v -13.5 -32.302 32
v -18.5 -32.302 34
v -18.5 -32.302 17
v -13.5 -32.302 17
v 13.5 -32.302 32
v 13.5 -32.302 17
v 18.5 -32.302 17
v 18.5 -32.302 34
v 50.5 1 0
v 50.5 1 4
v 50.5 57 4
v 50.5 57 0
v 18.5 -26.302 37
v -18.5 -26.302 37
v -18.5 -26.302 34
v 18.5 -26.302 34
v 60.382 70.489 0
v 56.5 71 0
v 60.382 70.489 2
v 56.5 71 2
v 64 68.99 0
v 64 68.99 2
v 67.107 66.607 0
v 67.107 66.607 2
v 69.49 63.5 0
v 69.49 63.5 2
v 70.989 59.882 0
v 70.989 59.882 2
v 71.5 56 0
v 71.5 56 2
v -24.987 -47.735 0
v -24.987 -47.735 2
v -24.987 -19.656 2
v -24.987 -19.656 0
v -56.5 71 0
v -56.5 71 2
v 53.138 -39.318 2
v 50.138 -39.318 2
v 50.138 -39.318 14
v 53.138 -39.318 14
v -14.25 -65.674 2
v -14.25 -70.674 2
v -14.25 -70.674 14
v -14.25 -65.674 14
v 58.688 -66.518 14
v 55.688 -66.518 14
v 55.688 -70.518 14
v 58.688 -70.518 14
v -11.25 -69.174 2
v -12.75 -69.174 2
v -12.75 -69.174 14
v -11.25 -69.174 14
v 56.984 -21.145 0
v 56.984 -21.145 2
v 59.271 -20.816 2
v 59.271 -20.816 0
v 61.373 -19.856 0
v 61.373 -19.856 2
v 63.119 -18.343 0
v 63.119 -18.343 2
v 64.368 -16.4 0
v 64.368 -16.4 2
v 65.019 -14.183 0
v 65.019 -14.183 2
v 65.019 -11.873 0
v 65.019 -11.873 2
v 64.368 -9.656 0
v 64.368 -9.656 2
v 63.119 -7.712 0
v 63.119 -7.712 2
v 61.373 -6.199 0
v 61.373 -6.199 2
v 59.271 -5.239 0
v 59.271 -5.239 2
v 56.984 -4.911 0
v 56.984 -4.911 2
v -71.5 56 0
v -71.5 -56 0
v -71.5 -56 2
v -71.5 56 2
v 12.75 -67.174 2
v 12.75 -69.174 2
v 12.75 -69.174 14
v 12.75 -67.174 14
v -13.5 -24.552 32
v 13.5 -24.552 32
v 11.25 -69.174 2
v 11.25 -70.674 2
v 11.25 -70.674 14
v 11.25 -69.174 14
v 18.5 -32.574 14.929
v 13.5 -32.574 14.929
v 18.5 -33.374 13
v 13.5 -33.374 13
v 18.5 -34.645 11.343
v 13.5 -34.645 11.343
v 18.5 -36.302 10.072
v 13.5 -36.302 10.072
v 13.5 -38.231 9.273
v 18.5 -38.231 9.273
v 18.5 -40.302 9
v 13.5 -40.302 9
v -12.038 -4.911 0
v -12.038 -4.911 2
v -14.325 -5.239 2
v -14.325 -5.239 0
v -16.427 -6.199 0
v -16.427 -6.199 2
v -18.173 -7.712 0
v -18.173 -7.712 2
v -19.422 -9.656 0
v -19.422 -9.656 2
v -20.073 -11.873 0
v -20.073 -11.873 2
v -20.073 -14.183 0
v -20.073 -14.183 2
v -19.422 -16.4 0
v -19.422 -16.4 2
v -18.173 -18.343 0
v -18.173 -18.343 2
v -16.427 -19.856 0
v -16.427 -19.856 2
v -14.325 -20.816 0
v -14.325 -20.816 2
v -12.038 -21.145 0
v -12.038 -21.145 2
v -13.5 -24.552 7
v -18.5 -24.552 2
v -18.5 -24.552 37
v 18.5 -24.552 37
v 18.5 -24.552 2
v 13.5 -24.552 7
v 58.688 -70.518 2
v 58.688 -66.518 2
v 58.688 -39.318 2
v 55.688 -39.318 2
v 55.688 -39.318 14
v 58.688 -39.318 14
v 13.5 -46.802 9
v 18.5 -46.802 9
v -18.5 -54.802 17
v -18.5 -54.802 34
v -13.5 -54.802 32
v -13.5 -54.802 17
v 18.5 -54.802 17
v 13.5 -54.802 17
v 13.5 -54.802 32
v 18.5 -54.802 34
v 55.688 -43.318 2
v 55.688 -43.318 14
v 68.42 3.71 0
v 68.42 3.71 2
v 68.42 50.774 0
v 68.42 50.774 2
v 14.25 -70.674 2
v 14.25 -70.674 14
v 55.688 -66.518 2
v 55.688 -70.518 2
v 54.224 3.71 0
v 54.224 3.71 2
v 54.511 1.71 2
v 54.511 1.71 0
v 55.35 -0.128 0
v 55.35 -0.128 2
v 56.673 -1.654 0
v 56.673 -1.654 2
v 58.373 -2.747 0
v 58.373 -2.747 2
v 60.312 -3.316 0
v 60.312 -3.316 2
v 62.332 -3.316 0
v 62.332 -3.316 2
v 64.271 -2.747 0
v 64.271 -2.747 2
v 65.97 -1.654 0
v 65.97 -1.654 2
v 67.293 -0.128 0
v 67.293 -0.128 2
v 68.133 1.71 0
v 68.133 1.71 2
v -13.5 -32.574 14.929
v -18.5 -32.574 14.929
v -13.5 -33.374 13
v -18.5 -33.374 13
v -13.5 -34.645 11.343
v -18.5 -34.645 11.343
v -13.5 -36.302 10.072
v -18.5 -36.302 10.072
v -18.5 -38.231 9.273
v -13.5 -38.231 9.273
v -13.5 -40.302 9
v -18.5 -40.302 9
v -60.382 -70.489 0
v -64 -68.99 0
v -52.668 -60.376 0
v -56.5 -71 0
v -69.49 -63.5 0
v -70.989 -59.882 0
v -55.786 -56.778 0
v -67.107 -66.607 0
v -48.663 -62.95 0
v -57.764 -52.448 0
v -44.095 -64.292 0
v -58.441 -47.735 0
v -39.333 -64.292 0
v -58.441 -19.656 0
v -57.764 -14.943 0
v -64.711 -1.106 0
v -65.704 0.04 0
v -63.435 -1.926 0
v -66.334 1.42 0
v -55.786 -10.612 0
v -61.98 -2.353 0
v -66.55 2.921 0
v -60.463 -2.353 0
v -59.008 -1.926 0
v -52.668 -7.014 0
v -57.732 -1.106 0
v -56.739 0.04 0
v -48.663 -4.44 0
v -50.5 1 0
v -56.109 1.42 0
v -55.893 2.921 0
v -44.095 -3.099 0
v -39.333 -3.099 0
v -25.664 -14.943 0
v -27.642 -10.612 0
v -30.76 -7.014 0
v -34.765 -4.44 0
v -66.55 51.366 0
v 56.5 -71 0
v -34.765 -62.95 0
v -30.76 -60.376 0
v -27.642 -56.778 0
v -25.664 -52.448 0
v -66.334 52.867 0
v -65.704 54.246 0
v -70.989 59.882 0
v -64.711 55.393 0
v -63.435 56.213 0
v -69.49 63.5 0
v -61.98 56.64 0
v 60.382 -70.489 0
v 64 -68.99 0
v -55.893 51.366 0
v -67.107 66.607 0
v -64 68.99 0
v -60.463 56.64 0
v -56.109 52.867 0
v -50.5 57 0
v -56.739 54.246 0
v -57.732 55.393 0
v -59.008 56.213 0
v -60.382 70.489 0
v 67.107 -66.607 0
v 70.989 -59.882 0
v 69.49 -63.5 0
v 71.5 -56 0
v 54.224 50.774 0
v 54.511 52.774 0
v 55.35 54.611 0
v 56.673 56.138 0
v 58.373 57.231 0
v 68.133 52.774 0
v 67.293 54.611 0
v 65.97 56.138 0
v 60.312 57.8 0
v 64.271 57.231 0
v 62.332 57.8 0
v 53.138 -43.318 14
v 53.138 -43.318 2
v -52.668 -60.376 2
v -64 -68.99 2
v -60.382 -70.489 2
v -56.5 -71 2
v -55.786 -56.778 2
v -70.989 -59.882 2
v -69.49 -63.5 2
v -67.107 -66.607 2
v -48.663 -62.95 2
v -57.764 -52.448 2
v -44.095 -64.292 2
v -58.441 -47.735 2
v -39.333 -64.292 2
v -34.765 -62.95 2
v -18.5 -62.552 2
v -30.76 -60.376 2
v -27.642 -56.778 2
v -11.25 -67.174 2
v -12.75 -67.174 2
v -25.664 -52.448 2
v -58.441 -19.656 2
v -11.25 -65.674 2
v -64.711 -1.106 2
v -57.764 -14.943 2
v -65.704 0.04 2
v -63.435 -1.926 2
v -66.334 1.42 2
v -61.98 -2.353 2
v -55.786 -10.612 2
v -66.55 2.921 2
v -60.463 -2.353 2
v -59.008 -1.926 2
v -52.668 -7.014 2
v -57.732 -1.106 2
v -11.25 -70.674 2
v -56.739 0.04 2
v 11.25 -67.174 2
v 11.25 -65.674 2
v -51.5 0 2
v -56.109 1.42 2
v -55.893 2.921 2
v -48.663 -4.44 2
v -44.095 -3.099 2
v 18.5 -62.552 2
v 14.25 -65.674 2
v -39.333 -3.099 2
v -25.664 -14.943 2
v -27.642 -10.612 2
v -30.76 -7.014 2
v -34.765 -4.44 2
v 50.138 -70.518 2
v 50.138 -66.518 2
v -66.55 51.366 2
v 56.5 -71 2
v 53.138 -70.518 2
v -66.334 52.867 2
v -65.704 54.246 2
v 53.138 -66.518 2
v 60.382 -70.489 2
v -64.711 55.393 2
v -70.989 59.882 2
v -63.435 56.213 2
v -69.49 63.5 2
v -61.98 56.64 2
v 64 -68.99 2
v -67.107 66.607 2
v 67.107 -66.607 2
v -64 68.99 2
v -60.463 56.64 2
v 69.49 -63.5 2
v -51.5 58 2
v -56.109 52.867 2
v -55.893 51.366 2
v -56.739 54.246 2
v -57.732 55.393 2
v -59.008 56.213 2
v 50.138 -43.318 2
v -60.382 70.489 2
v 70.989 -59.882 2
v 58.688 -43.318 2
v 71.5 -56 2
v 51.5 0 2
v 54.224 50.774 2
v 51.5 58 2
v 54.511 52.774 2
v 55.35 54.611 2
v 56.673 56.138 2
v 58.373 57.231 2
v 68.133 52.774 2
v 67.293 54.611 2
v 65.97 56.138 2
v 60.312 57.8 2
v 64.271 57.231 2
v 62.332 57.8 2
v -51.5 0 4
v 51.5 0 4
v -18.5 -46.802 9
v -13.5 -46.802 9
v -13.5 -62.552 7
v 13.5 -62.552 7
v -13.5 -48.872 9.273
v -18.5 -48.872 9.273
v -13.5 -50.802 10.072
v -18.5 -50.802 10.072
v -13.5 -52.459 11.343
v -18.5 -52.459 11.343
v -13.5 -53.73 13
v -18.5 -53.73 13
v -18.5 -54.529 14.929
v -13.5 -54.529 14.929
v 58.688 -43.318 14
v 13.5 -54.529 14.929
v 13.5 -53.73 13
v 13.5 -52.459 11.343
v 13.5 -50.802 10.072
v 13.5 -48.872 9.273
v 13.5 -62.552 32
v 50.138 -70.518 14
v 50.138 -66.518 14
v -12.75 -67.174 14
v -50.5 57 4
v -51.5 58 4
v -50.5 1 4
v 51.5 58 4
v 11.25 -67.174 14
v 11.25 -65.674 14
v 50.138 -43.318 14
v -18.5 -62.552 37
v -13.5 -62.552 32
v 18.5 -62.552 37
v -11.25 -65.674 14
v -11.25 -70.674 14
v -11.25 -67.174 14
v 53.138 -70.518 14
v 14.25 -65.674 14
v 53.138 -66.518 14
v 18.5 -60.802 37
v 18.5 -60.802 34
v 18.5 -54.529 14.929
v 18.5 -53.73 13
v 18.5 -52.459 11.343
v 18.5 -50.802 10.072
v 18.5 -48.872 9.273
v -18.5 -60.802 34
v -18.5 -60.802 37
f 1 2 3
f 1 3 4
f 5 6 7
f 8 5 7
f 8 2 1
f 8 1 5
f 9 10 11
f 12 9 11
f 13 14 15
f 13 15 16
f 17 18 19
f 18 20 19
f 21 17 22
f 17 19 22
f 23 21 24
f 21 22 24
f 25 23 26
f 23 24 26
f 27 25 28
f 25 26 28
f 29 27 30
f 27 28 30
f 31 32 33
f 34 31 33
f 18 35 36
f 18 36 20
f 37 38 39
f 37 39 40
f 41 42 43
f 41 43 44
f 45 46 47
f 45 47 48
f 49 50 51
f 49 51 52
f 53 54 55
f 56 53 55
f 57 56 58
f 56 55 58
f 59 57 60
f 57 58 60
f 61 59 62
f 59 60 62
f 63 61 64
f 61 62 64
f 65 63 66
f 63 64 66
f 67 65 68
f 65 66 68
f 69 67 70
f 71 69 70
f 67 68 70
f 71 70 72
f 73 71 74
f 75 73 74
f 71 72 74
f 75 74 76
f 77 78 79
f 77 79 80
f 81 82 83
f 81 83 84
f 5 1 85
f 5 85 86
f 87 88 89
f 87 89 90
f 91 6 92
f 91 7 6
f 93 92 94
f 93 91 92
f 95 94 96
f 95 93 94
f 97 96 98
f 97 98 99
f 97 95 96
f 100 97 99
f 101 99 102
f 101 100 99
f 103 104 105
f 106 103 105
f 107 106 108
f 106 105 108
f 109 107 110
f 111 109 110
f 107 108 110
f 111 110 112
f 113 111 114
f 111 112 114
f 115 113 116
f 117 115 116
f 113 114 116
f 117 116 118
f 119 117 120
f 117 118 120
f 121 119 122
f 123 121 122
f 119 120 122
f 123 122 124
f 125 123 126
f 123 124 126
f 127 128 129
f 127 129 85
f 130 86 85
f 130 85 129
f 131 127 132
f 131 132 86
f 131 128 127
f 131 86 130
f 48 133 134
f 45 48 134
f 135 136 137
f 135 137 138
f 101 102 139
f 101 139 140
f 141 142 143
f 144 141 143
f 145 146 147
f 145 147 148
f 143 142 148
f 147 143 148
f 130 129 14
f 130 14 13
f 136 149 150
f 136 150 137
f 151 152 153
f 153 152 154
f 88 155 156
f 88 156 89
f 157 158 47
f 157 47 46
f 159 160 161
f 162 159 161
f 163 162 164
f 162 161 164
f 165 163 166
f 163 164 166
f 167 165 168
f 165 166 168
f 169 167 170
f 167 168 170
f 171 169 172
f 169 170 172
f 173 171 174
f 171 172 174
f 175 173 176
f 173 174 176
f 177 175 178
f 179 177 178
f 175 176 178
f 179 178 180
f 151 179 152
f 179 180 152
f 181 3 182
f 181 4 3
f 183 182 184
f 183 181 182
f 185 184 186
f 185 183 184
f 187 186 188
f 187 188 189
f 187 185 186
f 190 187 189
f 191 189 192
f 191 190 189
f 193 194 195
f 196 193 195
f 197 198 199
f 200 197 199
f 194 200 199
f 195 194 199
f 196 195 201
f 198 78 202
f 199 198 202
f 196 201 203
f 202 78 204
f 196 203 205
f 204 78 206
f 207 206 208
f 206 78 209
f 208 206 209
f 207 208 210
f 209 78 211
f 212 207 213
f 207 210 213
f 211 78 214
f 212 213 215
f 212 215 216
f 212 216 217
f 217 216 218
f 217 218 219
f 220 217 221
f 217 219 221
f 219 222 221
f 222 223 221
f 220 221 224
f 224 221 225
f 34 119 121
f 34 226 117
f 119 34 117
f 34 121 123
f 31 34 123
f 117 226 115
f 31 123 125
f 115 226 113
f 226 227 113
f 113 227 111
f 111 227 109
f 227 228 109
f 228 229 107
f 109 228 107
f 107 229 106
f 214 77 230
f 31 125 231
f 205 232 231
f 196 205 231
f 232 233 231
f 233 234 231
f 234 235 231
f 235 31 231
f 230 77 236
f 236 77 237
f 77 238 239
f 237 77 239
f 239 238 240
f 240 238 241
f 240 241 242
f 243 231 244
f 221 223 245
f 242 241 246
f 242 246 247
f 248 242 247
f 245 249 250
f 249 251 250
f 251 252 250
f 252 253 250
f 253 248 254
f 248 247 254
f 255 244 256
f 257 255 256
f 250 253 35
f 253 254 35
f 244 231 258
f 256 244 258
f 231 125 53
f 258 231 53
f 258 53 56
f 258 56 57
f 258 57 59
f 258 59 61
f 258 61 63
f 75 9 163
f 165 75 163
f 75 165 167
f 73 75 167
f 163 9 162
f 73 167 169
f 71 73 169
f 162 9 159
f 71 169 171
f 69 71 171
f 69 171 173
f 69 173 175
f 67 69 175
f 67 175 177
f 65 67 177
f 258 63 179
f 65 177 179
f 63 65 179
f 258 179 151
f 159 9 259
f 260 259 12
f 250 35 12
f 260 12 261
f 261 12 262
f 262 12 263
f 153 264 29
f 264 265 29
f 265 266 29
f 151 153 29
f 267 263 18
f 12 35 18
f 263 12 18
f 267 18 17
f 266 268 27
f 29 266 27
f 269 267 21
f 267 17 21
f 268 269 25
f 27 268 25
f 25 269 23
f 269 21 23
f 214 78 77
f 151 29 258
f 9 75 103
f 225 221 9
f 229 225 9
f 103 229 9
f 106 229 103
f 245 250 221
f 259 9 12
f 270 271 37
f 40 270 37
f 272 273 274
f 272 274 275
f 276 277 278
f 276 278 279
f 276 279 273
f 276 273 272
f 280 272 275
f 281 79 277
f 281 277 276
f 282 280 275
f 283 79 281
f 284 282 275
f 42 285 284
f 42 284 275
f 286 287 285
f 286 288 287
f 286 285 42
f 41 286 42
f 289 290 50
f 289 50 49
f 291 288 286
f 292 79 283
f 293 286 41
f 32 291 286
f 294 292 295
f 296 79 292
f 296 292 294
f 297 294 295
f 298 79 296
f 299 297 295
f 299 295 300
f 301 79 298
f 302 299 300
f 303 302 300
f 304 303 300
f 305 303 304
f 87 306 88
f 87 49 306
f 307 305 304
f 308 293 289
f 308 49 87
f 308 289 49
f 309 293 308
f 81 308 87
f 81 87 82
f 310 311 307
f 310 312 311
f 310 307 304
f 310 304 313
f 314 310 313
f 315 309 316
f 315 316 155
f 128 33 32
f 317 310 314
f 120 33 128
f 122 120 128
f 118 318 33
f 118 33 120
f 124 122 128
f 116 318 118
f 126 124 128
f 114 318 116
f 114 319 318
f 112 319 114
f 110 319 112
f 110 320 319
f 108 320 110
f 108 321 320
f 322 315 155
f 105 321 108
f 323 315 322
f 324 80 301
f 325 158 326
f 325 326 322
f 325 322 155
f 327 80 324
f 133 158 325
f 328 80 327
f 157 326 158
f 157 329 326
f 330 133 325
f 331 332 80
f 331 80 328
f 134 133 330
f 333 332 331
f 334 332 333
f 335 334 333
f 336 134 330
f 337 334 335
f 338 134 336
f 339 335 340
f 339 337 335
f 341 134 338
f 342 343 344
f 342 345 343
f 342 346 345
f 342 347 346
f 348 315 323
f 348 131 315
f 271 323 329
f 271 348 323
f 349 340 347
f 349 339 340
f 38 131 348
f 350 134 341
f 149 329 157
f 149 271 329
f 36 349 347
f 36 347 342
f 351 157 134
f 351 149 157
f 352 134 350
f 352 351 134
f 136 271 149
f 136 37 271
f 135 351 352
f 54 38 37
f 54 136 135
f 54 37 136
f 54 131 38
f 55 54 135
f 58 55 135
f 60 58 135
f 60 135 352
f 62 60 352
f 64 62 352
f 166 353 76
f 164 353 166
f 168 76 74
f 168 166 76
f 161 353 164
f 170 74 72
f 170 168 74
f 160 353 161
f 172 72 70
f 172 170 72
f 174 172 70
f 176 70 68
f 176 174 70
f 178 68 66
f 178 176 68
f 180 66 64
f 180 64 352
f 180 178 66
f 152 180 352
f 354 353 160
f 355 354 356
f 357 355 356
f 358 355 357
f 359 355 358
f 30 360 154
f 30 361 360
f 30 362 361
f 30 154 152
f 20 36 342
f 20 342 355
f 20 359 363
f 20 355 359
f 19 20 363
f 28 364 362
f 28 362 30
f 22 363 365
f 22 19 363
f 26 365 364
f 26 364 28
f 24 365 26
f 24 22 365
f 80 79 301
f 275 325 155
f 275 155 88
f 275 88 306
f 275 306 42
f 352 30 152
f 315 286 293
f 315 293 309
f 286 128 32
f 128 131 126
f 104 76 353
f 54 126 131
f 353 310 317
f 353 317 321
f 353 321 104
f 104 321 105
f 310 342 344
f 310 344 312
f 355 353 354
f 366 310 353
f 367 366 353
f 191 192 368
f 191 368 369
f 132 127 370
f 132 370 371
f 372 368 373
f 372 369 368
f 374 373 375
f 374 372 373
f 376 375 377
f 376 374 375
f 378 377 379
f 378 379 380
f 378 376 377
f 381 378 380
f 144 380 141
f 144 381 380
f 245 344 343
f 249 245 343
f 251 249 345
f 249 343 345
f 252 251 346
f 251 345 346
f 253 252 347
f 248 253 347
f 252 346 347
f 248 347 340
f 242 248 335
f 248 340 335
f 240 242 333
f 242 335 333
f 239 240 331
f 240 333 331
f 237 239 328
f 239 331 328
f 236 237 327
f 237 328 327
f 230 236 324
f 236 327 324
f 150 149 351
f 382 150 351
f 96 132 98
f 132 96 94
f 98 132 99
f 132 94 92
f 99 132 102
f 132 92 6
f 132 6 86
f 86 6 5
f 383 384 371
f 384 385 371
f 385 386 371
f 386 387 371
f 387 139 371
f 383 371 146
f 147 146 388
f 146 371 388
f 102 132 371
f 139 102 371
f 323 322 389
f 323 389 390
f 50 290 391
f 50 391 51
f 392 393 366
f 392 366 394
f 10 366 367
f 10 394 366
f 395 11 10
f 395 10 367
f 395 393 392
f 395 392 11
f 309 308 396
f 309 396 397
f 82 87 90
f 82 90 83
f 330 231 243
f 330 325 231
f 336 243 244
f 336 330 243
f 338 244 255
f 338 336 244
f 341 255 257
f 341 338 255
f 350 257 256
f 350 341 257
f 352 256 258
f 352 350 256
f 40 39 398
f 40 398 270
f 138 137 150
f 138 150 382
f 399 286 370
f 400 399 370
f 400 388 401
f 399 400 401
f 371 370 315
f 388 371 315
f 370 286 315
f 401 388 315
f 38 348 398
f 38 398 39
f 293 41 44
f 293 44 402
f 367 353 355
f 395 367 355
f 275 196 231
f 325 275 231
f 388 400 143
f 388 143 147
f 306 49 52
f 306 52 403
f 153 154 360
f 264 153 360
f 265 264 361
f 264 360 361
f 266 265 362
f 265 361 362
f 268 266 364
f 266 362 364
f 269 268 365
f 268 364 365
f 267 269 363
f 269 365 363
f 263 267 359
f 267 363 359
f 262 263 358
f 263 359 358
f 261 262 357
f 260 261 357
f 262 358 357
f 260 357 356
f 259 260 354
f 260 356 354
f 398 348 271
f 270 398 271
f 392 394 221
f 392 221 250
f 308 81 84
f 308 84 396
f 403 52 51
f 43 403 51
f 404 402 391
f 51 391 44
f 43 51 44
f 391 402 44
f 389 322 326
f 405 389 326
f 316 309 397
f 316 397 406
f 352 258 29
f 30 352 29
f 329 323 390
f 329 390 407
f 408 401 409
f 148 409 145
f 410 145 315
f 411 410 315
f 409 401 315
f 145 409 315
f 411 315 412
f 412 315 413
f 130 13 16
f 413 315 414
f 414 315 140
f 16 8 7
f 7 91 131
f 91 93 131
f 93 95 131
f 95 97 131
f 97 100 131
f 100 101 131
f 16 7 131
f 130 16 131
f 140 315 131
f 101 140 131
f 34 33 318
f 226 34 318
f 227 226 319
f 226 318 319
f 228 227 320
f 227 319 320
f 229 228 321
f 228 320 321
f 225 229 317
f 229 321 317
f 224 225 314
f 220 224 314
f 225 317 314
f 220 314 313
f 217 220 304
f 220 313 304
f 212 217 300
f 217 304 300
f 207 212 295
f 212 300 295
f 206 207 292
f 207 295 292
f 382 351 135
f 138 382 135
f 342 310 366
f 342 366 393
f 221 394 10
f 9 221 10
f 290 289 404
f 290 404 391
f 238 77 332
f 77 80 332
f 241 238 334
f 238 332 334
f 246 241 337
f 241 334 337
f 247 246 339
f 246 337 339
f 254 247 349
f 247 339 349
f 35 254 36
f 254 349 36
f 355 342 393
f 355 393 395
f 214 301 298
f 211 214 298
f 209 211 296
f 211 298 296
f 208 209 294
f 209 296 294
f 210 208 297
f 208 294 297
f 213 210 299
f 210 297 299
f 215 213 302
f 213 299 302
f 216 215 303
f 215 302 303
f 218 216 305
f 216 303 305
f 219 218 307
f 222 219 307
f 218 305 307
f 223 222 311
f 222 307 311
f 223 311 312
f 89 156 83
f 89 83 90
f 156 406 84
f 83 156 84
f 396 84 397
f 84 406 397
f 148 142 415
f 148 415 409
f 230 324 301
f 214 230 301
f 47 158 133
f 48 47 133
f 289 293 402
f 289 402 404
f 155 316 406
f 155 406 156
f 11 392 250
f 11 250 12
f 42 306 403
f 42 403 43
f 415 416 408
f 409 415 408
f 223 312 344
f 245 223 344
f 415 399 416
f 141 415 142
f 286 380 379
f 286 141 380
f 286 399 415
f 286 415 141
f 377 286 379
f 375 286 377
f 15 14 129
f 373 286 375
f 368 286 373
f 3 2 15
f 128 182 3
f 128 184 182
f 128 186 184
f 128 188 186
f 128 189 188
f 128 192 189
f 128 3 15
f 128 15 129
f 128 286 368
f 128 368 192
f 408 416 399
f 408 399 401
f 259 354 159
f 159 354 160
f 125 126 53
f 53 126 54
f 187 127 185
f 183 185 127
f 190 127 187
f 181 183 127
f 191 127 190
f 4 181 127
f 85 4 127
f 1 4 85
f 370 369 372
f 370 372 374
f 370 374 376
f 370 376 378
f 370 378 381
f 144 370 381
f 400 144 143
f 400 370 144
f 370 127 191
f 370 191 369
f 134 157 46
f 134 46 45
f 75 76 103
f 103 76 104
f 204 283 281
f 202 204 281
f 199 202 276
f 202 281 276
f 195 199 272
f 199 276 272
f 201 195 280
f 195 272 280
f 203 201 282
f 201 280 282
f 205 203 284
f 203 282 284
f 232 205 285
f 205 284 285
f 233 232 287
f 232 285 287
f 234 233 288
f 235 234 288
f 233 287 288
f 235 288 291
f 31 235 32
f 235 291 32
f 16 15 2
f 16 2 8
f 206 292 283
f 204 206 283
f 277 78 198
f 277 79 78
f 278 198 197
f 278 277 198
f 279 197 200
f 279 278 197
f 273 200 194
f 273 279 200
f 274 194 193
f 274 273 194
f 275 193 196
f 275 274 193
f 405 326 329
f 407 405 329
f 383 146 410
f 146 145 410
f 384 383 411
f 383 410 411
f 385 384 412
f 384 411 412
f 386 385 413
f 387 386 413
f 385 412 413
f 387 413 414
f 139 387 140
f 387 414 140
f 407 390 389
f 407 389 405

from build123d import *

# Parameters (mm, degrees)
SKETCH_W        = 143
SKETCH_H        = 142
PAD_DEPTH       = 2
SKETCH007_W     = 3
SKETCH007_H     = 4
PAD005_DEPTH    = 12
SKETCH008_W     = 103
SKETCH008_H     = 58
SKETCH008_W_2   = 101
SKETCH008_H_2   = 56
PAD006_DEPTH    = 2
SKETCH009_W     = 37
SKETCH009_H     = 38
PAD007_DEPTH    = 35
SKETCH010_W     = 37
SKETCH010_H     = 34.5
POCKET_DEPTH    = 3
SKETCH011_W     = 37
SKETCH011_H     = 22.5
POCKET001_DEPTH = 25
SKETCH013_W     = 27
SKETCH013_H     = 25
POCKET002_DEPTH = 45
SKETCH014_W     = 101
SKETCH014_H     = 56
POCKET003_DEPTH = 2.001
POCKET004_DEPTH = 2.001
FILLET_R        = 8
FILLET001_R     = 15


with BuildPart() as part:
    # Sketch → Pad (new body)
    with BuildSketch(Plane.XY):
        Rectangle(SKETCH_W, SKETCH_H)
    extrude(amount=PAD_DEPTH)

    # Sketch007 (on Face6 of Pad) → Pad005 (join)
    with BuildSketch(Plane.XY.offset(2)):
        with Locations((57.18826, -41.31823)):
            Rectangle(SKETCH007_W, SKETCH007_H)
        with Locations((51.63826, -41.31823)):
            Rectangle(SKETCH007_W, SKETCH007_H)
        with Locations((57.18826, -68.51823)):
            Rectangle(SKETCH007_W, SKETCH007_H)
        with Locations((51.63826, -68.51823)):
            Rectangle(SKETCH007_W, SKETCH007_H)
        Polygon((11.25, -65.67434), (14.25, -65.67434), (14.25, -70.67434), (11.25, -70.67434), (11.25, -69.17434), (12.75, -69.17434), (12.75, -67.17434), (11.25, -67.17434), align=None)
        Polygon((-14.25, -65.67434), (-11.25, -65.67434), (-11.25, -67.17434), (-12.75, -67.17434), (-12.75, -69.17434), (-11.25, -69.17434), (-11.25, -70.67434), (-14.25, -70.67434), align=None)
    extrude(amount=PAD005_DEPTH)

    # Sketch008 (on Face5 of Pad005) → Pad006 (join)
    with BuildSketch(Plane.XY.offset(2)):
        with Locations((0, 29)):
            Rectangle(SKETCH008_W, SKETCH008_H)
        with Locations((0, 29)):
            Rectangle(SKETCH008_W_2, SKETCH008_H_2, mode=Mode.SUBTRACT)
    extrude(amount=PAD006_DEPTH)

    # Sketch009 (on Face5 of Pad006) → Pad007 (join)
    with BuildSketch(Plane.XY.offset(2)):
        with Locations((0, -43.55182)):
            Rectangle(SKETCH009_W, SKETCH009_H)
    extrude(amount=PAD007_DEPTH)

    # Sketch010 (on Face48 of Pad007) → Pocket (cut)
    with BuildSketch(Plane.XY.offset(37)):
        with Locations((0, -43.55182)):
            Rectangle(SKETCH010_W, SKETCH010_H)
    extrude(amount=-POCKET_DEPTH, mode=Mode.SUBTRACT)

    # Sketch011 (on Face51 of Pocket) → Pocket001 (cut)
    with BuildSketch(Plane.XY.offset(34)):
        with Locations((0, -43.55182)):
            Rectangle(SKETCH011_W, SKETCH011_H)
    extrude(amount=-POCKET001_DEPTH, mode=Mode.SUBTRACT)

    # Sketch013 (on Face15 of Pocket001) → Pocket002 (cut)
    with BuildSketch(Plane.XZ.offset(62.55182)):
        with Locations((0, 19.5)):
            Rectangle(SKETCH013_W, SKETCH013_H)
    extrude(amount=-POCKET002_DEPTH, mode=Mode.SUBTRACT)

    # Sketch014 (on Face73 of Pocket002) → Pocket003 (cut, through all)
    with BuildSketch(Plane.XY.offset(2)):
        with Locations((0, 29)):
            Rectangle(SKETCH014_W, SKETCH014_H)
    extrude(amount=-POCKET003_DEPTH, mode=Mode.SUBTRACT)

    # Sketch015 (on Face5 of Pocket003) → Pocket004 (cut, through all)
    with BuildSketch(Plane.XY.offset(2)):
        with BuildLine():
            ThreePointArc((-24.986848, -19.655706), (-41.714005, -2.928549), (-58.441162, -19.655706))
            Line((-58.441162, -19.655706), (-58.441162, -47.734921))
            ThreePointArc((-58.441162, -47.734921), (-41.714005, -64.462078), (-24.986848, -47.734921))
            Line((-24.986848, -47.734921), (-24.986848, -19.655706))
        make_face()
        with BuildLine():
            ThreePointArc((-12.038252, -4.910588), (-20.155442, -13.027778), (-12.038252, -21.144968))
            Line((-12.038252, -21.144968), (56.984447, -21.144968))
            ThreePointArc((56.984447, -21.144968), (65.101637, -13.027778), (56.984447, -4.910588))
            Line((56.984447, -4.910588), (-12.038252, -4.910588))
        make_face()
        with BuildLine():
            ThreePointArc((-55.892961, 51.365669), (-61.221329, 56.694037), (-66.549697, 51.365669))
            Line((-66.549697, 51.365669), (-66.549697, 2.920796))
            ThreePointArc((-66.549697, 2.920796), (-61.221329, -2.407572), (-55.892961, 2.920796))
            Line((-55.892961, 2.920796), (-55.892961, 51.365669))
        make_face()
        with BuildLine():
            ThreePointArc((68.420184, 50.773804), (61.32185, 57.872138), (54.223516, 50.773804))
            Line((54.223516, 50.773804), (54.223516, 3.710121))
            ThreePointArc((54.223516, 3.710121), (61.32185, -3.388213), (68.420184, 3.710121))
            Line((68.420184, 3.710121), (68.420184, 50.773804))
        make_face()
    extrude(amount=-POCKET004_DEPTH, mode=Mode.SUBTRACT)

    # Fillet
    fillet_edges = [part.edges().sort_by_distance(p)[0] for p in [
        (16, -32.30182, 9),
        (-16, -32.30182, 9),
        (-16, -54.80182, 9),
        (16, -54.80182, 9),
    ]]
    fillet(fillet_edges, radius=FILLET_R)

    # Fillet001
    fillet001_edges = [part.edges().sort_by_distance(p)[0] for p in [
        (-71.5, -71, 1),
        (71.5, -71, 1),
        (71.5, 71, 1),
        (-71.5, 71, 1),
    ]]
    fillet(fillet001_edges, radius=FILLET001_R)


solid = part.part
